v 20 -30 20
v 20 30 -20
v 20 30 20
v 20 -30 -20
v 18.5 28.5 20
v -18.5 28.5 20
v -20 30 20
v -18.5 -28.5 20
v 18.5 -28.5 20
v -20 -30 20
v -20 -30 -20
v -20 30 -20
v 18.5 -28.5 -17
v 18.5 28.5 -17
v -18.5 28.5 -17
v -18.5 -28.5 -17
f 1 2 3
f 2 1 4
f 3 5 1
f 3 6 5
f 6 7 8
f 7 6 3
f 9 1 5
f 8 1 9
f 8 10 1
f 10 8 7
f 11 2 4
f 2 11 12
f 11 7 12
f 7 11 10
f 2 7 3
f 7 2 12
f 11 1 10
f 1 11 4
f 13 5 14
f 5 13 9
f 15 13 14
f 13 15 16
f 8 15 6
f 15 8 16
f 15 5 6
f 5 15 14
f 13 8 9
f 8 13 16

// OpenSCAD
box_width = 60;
box_height = 40;
box_depth = 40;
box_side_width = 3;
box_extra = box_width / 2;


difference(){
    
    //outside
    cube([box_height,box_width,box_depth], true);
    //inside
    translate([0,0,3]) cube([box_height - box_side_width ,box_width - box_side_width,box_depth - box_side_width + 3], true);

}
